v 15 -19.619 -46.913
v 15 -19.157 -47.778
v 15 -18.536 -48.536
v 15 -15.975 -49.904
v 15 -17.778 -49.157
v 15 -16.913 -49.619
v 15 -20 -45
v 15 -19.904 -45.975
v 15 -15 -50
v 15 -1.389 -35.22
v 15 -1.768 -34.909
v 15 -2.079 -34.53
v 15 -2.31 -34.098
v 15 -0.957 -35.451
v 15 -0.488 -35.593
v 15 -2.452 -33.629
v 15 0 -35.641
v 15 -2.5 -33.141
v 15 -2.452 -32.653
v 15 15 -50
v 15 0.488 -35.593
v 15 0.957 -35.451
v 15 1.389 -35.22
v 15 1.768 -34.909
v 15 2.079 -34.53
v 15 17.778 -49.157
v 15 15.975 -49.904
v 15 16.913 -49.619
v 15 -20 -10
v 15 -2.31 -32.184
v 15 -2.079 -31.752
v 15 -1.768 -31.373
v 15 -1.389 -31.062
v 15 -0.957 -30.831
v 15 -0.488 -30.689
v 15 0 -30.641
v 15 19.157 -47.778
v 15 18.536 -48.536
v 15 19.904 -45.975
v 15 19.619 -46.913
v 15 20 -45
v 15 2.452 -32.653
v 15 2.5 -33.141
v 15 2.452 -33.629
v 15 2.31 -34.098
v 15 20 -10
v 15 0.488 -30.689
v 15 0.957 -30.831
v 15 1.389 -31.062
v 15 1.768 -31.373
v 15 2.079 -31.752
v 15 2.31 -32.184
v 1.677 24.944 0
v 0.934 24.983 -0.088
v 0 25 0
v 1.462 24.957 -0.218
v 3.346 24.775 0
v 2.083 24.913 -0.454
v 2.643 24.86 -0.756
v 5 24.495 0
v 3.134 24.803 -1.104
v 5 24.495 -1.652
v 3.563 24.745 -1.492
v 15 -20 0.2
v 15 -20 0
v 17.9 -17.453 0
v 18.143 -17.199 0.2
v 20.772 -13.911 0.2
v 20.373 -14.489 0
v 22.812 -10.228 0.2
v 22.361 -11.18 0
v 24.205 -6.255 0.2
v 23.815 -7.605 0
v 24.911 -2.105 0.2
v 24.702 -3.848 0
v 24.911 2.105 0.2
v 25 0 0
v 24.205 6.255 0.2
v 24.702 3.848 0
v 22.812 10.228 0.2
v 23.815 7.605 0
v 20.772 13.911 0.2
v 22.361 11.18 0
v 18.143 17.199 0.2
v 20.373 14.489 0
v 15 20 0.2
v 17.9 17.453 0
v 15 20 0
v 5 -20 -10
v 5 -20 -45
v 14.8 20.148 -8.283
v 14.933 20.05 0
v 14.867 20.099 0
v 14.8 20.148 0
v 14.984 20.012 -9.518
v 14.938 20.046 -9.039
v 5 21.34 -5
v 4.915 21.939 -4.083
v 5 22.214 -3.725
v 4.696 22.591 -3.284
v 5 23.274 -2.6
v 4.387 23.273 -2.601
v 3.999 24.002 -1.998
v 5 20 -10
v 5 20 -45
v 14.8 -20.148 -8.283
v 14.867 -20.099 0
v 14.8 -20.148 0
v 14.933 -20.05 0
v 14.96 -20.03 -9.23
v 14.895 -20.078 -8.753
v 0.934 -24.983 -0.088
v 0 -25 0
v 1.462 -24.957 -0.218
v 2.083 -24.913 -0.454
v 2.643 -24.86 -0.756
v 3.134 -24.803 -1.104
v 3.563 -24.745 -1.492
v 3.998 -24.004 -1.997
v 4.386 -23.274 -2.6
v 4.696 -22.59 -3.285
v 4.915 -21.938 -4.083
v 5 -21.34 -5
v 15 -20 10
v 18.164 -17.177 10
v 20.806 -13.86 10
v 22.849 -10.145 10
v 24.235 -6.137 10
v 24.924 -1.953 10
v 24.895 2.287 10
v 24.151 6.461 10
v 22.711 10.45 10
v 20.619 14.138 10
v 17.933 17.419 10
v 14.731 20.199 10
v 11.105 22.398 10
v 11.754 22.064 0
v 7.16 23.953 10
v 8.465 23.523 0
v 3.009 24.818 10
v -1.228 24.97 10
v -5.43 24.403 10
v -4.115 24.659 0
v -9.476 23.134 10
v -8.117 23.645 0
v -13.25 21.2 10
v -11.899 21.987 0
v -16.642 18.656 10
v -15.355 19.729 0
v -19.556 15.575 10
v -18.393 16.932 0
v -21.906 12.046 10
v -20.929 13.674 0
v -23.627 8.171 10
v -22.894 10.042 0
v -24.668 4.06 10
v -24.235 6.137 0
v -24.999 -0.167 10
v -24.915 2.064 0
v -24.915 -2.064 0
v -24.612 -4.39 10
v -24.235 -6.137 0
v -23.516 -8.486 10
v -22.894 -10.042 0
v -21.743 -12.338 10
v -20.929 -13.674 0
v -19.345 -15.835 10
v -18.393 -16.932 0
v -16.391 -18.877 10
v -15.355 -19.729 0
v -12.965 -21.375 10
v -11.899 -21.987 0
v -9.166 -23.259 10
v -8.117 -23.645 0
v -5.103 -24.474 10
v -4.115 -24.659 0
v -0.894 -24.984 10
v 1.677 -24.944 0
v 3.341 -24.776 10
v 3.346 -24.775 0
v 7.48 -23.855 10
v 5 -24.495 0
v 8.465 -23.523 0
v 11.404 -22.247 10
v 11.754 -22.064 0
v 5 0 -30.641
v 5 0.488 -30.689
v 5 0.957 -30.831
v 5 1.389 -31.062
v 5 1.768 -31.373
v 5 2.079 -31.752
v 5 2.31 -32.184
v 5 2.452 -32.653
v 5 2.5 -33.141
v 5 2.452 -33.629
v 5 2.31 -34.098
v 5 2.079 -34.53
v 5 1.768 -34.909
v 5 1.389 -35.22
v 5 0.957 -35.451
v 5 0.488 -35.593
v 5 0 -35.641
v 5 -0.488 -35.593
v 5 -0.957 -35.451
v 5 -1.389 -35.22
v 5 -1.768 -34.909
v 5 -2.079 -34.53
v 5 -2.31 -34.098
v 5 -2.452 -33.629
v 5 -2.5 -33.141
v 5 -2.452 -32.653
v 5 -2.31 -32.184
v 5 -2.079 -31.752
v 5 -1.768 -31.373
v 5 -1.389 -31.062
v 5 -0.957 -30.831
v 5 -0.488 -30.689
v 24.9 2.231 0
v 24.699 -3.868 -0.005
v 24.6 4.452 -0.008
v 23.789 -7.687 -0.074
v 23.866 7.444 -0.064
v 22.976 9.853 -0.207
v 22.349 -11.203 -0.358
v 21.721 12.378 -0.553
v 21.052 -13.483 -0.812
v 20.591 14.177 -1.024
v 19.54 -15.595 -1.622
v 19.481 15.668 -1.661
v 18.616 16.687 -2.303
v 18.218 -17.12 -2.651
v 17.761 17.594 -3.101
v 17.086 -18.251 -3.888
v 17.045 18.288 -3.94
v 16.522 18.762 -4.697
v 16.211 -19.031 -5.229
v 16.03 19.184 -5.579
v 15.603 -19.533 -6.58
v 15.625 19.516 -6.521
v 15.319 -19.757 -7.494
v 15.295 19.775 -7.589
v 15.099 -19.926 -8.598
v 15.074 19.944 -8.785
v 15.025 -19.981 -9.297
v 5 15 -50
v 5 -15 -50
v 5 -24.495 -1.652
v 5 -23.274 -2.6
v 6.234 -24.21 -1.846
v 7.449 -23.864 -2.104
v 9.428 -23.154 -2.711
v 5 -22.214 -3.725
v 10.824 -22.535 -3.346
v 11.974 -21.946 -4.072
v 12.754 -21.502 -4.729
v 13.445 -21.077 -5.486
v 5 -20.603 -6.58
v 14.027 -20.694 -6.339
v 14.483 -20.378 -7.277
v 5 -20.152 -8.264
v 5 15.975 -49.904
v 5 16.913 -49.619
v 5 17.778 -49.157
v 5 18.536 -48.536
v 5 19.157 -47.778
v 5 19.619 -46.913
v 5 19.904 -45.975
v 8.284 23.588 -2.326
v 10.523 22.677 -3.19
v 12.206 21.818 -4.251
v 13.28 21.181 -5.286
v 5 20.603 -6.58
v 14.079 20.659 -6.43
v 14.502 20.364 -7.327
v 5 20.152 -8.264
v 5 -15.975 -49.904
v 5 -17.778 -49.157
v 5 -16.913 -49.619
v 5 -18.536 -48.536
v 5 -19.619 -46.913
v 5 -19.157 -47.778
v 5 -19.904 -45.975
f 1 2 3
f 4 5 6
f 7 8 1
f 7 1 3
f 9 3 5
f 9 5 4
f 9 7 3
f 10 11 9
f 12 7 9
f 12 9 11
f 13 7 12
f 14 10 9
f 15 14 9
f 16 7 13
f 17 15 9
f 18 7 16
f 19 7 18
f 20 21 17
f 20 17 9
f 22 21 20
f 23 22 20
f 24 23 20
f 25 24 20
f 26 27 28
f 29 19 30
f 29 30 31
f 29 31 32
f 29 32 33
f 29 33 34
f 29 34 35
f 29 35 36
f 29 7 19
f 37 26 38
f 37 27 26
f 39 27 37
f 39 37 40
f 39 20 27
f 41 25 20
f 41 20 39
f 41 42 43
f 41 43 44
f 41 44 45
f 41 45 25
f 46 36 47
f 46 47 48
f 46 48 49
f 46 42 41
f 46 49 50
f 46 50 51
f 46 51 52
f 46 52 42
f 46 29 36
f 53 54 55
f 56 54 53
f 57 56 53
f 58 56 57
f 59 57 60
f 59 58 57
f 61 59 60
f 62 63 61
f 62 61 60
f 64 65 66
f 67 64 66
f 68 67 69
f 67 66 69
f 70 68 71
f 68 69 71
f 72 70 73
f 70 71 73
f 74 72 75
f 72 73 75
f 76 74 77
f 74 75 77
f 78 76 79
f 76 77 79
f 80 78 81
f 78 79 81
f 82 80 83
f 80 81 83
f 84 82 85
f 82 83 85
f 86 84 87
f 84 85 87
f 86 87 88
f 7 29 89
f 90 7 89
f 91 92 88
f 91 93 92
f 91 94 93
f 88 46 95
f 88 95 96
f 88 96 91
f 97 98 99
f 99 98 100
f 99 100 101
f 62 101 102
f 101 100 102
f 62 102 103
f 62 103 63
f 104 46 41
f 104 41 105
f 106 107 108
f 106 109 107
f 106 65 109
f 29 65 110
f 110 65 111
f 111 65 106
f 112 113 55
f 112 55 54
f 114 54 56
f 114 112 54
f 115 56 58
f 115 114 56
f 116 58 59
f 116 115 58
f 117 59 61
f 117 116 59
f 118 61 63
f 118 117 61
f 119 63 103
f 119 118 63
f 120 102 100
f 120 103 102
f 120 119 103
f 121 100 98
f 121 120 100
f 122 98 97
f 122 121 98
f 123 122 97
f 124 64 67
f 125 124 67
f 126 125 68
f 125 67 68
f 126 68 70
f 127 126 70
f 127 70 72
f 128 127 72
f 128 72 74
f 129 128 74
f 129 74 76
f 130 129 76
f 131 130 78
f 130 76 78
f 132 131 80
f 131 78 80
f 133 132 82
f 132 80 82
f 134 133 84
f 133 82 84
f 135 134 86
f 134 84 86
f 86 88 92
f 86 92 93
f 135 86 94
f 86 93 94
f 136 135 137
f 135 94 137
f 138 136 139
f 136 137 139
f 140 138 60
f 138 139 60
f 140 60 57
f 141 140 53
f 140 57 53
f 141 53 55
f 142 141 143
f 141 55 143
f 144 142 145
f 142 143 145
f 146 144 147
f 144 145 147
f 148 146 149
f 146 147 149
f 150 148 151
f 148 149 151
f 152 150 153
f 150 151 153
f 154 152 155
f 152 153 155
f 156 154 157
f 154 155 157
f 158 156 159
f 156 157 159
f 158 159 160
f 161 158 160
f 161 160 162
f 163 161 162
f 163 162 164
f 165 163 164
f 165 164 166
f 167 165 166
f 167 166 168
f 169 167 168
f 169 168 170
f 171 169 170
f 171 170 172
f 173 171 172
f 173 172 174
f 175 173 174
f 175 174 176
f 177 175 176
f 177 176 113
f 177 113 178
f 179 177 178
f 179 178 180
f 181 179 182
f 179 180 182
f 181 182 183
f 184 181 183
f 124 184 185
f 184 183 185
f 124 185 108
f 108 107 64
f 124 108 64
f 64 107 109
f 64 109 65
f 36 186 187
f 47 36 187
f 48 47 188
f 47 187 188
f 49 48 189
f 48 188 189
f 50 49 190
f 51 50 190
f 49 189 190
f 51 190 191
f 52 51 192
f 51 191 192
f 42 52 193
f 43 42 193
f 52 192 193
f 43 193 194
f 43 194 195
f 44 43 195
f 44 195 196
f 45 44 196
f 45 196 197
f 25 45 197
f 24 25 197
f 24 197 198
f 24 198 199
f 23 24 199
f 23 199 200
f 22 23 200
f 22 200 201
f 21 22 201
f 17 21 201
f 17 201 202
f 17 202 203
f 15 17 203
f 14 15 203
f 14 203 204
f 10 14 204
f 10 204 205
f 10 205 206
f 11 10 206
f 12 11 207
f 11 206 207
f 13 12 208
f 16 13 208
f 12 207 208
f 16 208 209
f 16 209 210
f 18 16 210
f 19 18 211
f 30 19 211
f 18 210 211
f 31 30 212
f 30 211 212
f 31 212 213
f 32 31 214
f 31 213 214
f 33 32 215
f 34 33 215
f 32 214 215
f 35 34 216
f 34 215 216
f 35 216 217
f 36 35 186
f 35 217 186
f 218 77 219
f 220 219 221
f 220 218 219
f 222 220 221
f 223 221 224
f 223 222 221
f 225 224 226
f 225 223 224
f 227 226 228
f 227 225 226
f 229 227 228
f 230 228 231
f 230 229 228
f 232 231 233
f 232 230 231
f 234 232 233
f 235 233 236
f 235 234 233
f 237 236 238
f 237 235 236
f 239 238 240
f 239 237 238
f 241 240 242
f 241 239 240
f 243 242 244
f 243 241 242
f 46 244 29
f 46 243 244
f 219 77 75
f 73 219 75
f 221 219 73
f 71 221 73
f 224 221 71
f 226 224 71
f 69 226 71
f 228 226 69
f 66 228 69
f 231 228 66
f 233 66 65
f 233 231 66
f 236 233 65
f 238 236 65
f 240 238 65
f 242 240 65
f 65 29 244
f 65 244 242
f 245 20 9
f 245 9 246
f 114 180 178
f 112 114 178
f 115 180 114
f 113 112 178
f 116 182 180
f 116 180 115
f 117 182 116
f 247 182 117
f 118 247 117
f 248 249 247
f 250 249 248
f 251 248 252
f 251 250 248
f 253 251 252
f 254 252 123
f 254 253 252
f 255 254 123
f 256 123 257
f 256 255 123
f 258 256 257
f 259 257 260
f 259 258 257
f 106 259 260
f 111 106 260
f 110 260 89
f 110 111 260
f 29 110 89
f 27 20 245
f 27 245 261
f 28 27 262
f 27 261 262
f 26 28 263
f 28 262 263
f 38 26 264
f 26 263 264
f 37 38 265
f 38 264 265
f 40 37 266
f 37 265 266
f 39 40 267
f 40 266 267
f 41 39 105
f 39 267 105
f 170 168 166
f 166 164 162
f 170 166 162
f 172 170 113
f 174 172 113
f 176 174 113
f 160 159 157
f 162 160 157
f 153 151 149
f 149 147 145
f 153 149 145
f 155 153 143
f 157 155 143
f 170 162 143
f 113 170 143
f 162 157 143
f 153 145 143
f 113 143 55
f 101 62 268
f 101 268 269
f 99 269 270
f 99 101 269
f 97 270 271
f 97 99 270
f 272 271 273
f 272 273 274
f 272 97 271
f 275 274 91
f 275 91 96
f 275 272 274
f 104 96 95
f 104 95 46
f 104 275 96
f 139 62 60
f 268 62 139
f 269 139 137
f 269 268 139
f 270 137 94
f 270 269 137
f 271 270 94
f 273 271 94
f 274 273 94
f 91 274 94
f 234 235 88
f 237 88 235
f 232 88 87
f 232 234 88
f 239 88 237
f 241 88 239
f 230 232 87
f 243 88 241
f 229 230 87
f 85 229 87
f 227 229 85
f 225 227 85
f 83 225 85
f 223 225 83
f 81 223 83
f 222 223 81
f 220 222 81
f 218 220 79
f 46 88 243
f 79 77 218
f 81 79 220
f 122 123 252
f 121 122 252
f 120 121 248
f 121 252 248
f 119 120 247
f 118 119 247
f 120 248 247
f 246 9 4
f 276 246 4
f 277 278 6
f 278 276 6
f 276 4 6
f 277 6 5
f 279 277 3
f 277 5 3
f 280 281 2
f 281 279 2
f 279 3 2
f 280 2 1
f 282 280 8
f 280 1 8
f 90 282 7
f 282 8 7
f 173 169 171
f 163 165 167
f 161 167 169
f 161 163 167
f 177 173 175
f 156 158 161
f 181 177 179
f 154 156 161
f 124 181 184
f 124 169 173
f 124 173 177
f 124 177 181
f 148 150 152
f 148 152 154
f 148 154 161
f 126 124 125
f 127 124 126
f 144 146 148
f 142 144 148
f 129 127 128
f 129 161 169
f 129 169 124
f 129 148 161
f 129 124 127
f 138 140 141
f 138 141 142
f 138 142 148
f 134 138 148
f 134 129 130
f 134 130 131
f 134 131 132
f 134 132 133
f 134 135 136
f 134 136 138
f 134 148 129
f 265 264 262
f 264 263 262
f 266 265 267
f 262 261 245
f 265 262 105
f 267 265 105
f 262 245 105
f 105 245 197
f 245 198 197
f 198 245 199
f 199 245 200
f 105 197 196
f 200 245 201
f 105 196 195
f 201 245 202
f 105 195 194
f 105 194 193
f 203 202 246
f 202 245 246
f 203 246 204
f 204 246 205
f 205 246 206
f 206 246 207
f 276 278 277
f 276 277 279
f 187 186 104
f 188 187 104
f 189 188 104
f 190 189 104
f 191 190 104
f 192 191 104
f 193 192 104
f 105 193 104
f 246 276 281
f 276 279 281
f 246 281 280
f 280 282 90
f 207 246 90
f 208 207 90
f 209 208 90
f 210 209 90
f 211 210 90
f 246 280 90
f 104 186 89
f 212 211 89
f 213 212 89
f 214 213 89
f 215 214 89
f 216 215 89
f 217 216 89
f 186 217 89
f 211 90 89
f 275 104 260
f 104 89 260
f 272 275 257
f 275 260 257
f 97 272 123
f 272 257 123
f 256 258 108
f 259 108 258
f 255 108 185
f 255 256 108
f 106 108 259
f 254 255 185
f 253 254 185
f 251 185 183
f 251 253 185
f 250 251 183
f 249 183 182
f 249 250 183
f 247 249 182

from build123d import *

# Parameters (mm, degrees)
SKETCH1_W           = 10
SKETCH1_H           = 40
BOSS_EXTRUDE1_DEPTH = 10
SKETCH2_W           = 10
SKETCH2_H           = 40
BOSS_EXTRUDE2_DEPTH = 50
FILLET1_R           = 10
FILLET2_R           = 10
FILLET3_R           = 5
SKETCH3_R           = 2.4999999999999982
CUT_EXTRUDE1_DEPTH  = 50


with BuildPart() as part:
    # Sketch1 → Boss-Extrude1 (new body)
    with BuildSketch(Plane.XY):
        with BuildLine():
            Line((15, -20), (5.000000000000001, -20))
            Line((5.000000000000001, -20), (5.000000000000001, 20))
            Line((5.000000000000001, 20), (15, 20))
            ThreePointArc((15.000000000000002, 20), (-25, 3.06e-15), (14.999999999999995, -20.000000000000004))
        make_face()
        with BuildLine():
            Line((15.000000000000002, 20), (15.000000000000002, -20))
            ThreePointArc((14.999999999999995, -20.000000000000004), (22.360679774997894, -11.180339887498954), (25, -6.12e-15))
            ThreePointArc((25, 0), (22.360679774997898, 11.180339887498947), (15.000000000000002, 20))
        make_face()
        with Locations((10.000000000000002, 0)):
            Rectangle(SKETCH1_W, SKETCH1_H)
    extrude(amount=BOSS_EXTRUDE1_DEPTH)

    # Sketch2 → Boss-Extrude2 (add)
    with BuildSketch(Plane(origin=(0, 0, 0), x_dir=(-1, 0, 0), z_dir=(0, 0, -1))):
        with Locations((-10.000000000000002, 0)):
            Rectangle(SKETCH2_W, SKETCH2_H)
    extrude(amount=BOSS_EXTRUDE2_DEPTH)

    # Fillet1
    # the kernel refuses this fillet: 10 mm, written as the material it adds along each edge
    with BuildSketch(Plane(origin=(15.000000000000002, 20, 0), x_dir=(1, 0, 0), z_dir=(0, -1, 0))) as fillet1_piece_1_section:
        with BuildLine():
            CenterArc((FILLET1_R, -FILLET1_R), FILLET1_R, 90, 90)
            Line((-1.78e-15, -FILLET1_R), (-FILLET1_R * 0.02, -FILLET1_R))
            Line((-FILLET1_R * 0.02, -FILLET1_R), (-FILLET1_R * 0.02, FILLET1_R * 0.02))
            Line((-FILLET1_R * 0.02, FILLET1_R * 0.02), (FILLET1_R, FILLET1_R * 0.02))
            Line((FILLET1_R, FILLET1_R * 0.02), (FILLET1_R, 0))
        make_face()
    fillet1_piece_1 = extrude(amount=40, mode=Mode.PRIVATE)
    fillet1_piece_1 = fillet1_piece_1 & Plane(origin=(0, 0, -2.4332556101224805), x_dir=(0.6000000000000001, 0.8, 0), z_dir=(0, 0, -1)) * Cylinder(25, 120, mode=Mode.PRIVATE)
    add(fillet1_piece_1)

    # Fillet2
    # the kernel refuses this fillet: 10 mm, written as the material it adds along each edge
    with BuildSketch(Plane(origin=(5.000000000000001, 20, 0), x_dir=(0, 0, -1), z_dir=(1, 0, 0))) as fillet2_piece_1_section:
        with BuildLine():
            CenterArc((FILLET2_R, FILLET2_R), FILLET2_R, 180, 90)
            Line((-1.78e-15, FILLET2_R), (0, 0))
            Line((0, 0), (FILLET2_R, 0))
        make_face()
    fillet2_piece_1 = extrude(amount=9.8, mode=Mode.PRIVATE)
    fillet2_piece_1 = fillet2_piece_1 & Plane(origin=(0, 0, -2.8273844983564325), x_dir=(0.6000000000000001, 0.8, 0), z_dir=(0, 0, -1)) * Cylinder(25, 60, mode=Mode.PRIVATE)
    add(fillet2_piece_1)
    with BuildSketch(Plane(origin=(14.8, -20, 0), x_dir=(0, 0, -1), z_dir=(-1, 0, 0))) as fillet2_piece_2_section:
        with BuildLine():
            CenterArc((FILLET2_R, FILLET2_R), FILLET2_R, 180, 90)
            Line((-1.78e-15, FILLET2_R), (0, 0))
            Line((0, 0), (FILLET2_R, 0))
        make_face()
    fillet2_piece_2 = extrude(amount=9.799999999999999, mode=Mode.PRIVATE)
    fillet2_piece_2 = fillet2_piece_2 & Plane(origin=(0, 0, -2.827384190918209), x_dir=(0.6000000000000001, 0.8, 0), z_dir=(0, 0, -1)) * Cylinder(25, 60, mode=Mode.PRIVATE)
    add(fillet2_piece_2)
    with BuildSketch(Plane(origin=(40, -20, 0), x_dir=(0, 0, -1), z_dir=(-1, 0, 0))) as fillet2_piece_3_section:
        with BuildLine():
            CenterArc((FILLET2_R, FILLET2_R), FILLET2_R, 180, 90)
            Line((-1.78e-15, FILLET2_R), (0, 0))
            Line((0, 0), (FILLET2_R, 0))
        make_face()
    fillet2_piece_3 = extrude(amount=25.2, mode=Mode.PRIVATE)
    fillet2_piece_3 = fillet2_piece_3 & Plane(origin=(0, 0, -4.548731102364826), x_dir=(0.6, 0.8, 0), z_dir=(0, 0, -1)) * Cylinder(25, 91, mode=Mode.PRIVATE)
    add(fillet2_piece_3)
    with BuildSketch(Plane(origin=(14.8, 20, 0), x_dir=(0, 0, -1), z_dir=(1, 0, 0))) as fillet2_piece_4_section:
        with BuildLine():
            CenterArc((FILLET2_R, FILLET2_R), FILLET2_R, 180, 90)
            Line((-1.78e-15, FILLET2_R), (0, 0))
            Line((0, 0), (FILLET2_R, 0))
        make_face()
    fillet2_piece_4 = extrude(amount=25.2, mode=Mode.PRIVATE)
    fillet2_piece_4 = fillet2_piece_4 & Plane(origin=(0, 0, -4.548731089357503), x_dir=(0.6, 0.8, 0), z_dir=(0, 0, -1)) * Cylinder(25, 91, mode=Mode.PRIVATE)
    add(fillet2_piece_4)

    # Fillet3
    # the kernel refuses this fillet: 5 mm, written as the material it adds along each edge
    with BuildSketch(Plane(origin=(5, -36.99489742783178, 0), x_dir=(-1, 0, 0), z_dir=(0, 1, 0))) as fillet3_piece_1_section:
        with BuildLine():
            CenterArc((FILLET3_R, -FILLET3_R), FILLET3_R, 90, 90)
            Line((-8.9e-16, -FILLET3_R), (0, 0))
            Line((0, 0), (FILLET3_R, 0))
        make_face()
    fillet3_piece_1 = extrude(amount=73.98979485566356, mode=Mode.PRIVATE)
    fillet3_piece_1 = fillet3_piece_1 - Plane(origin=(3.8491362999010033, 30, -10), x_dir=(0, 0, -1), z_dir=(-1, 0, 0)) * Cylinder(10, 168, mode=Mode.PRIVATE)
    fillet3_piece_1 = fillet3_piece_1 & Plane(origin=(0, 0, -1.1013150030841163), x_dir=(0.6000000000000001, 0.8, 0), z_dir=(0, 0, -1)) * Cylinder(25, 168, mode=Mode.PRIVATE)
    fillet3_piece_1 = fillet3_piece_1 - Plane(origin=(3.849136299901005, -30, -10), x_dir=(0, 0, -1), z_dir=(1, 0, 0)) * Cylinder(10, 168, mode=Mode.PRIVATE)
    add(fillet3_piece_1)
    # the kernel refuses this fillet: 5 mm, written as the material it takes off along each edge
    with BuildSketch(Plane(origin=(27.5, -20, -50), x_dir=(0, 1, 0), z_dir=(-1, 0, 0))) as fillet3_2_piece_1:
        with BuildLine():
            CenterArc((FILLET3_R, -FILLET3_R), FILLET3_R, 90, 90)
            Line((0, -FILLET3_R), (0, 0))
            Line((0, 0), (FILLET3_R, 0))
        make_face()
    extrude(amount=35, mode=Mode.SUBTRACT)
    with BuildSketch(Plane(origin=(-7.499999999999999, 20, -50), x_dir=(0, 0, 1), z_dir=(1, 0, 0))) as fillet3_2_piece_2:
        with BuildLine():
            CenterArc((FILLET3_R, FILLET3_R), FILLET3_R, 180, 90)
            Line((0, FILLET3_R), (0, 0))
            Line((0, 0), (FILLET3_R, 0))
        make_face()
    extrude(amount=35, mode=Mode.SUBTRACT)

    # Sketch3 → Cut-Extrude1 (cut)
    with BuildSketch(Plane.ZY.offset(-5.000000000000001)):
        with Locations((-33.14088712721044, 0)):
            Circle(SKETCH3_R)
    extrude(amount=-CUT_EXTRUDE1_DEPTH, mode=Mode.SUBTRACT)


solid = part.part
